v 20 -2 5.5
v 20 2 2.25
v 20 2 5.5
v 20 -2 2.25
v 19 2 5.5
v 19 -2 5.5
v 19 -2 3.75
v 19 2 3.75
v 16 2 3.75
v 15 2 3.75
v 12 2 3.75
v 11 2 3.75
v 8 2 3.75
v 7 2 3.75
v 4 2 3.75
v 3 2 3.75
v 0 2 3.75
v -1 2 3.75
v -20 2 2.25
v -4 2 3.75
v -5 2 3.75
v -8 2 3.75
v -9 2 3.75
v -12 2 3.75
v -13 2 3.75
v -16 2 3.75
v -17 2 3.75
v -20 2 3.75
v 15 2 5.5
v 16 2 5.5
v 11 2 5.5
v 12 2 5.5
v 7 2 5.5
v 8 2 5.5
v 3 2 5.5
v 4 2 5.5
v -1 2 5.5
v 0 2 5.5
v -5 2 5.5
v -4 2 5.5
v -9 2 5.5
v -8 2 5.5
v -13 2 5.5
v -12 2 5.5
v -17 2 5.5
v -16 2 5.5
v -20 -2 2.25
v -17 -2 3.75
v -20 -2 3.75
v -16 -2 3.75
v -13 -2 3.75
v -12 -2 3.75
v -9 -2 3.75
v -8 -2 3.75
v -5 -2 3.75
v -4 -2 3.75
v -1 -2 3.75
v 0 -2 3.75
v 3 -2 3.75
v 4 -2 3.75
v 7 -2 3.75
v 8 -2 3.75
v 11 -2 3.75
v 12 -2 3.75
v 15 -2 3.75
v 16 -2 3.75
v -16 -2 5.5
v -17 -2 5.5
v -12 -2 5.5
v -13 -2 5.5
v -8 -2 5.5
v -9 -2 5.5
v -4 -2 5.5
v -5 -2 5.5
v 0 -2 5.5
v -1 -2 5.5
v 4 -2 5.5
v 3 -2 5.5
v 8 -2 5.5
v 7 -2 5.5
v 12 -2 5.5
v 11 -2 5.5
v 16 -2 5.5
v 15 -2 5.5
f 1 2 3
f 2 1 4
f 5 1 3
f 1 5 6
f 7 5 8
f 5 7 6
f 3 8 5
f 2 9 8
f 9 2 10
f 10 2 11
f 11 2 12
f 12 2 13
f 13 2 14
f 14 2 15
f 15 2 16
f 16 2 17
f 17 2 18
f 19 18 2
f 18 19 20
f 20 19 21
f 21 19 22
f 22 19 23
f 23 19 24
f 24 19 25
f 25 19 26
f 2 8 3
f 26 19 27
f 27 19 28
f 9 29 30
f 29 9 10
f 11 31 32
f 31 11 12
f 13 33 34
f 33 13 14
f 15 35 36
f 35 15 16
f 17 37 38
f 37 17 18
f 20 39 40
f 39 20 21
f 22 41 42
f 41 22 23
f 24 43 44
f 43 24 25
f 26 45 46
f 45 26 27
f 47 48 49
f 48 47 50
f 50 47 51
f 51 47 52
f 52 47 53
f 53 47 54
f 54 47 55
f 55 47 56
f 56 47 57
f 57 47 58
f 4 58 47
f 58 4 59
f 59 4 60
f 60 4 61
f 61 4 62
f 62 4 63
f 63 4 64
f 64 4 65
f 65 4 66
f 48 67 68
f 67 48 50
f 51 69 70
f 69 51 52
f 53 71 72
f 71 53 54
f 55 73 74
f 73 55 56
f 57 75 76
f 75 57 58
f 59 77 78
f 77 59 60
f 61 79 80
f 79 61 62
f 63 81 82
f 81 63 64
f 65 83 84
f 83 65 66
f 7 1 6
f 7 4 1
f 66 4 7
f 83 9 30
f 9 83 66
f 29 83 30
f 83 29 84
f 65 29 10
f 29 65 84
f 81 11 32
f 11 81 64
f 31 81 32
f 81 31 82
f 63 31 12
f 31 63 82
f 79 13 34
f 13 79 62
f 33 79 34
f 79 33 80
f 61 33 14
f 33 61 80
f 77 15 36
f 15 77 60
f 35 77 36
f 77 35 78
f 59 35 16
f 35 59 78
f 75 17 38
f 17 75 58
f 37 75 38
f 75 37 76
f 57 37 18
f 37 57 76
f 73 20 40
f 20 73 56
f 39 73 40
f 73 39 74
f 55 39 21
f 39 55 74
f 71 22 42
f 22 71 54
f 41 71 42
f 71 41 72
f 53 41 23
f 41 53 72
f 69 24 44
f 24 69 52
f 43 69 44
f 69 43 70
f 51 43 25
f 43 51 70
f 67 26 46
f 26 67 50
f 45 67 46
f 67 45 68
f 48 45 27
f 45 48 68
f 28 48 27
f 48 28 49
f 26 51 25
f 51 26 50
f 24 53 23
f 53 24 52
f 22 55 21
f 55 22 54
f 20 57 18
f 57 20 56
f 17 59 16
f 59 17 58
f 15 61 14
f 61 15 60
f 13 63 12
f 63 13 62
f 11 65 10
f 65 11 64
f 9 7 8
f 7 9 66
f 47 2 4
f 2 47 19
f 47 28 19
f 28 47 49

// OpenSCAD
// file: thread.scad
module slice(t, width){
    rotate(90, [1, 0, 0])
    linear_extrude(height=0.01)
    polygon([
        [-t/2, -width/2],
        [-t/2, width/2],
        [t/2, width/2],
        [t/2, 0]
    ]);
    //cube([t, 0.01, width], center=true);
}

module thread(
    pitch = 3,
    width = 1,
    r = 3,
    t = 1,
    laps = 2,
    steps_per_lap = 20
){
    eps = 0.01;
    for (i = [0:steps_per_lap * laps - 1]){
        hull(){
            translate([0, 0, pitch * i/steps_per_lap])
            rotate(360 * i/steps_per_lap)
            translate([t/2 + r, 0, 0])
            slice(t, width);
                
            translate([0, 0, pitch * (i + 1)/steps_per_lap])
            rotate(360 * (i+1)/steps_per_lap)
            translate([t/2 + r, 0, 0])
            slice(t, width);
        }
    }
}

module inner_thread(
    pitch = 3,
    width = 1,
    r = 3,
    t = 1,
    laps = 2,
    steps_per_lap = 20
){
    eps = 0.01;
    for (i = [0:steps_per_lap * laps - 1]){
        hull(){
            translate([0, 0, pitch * i/steps_per_lap])
            rotate(360 * i/steps_per_lap)
            translate([t/2 + r, 0, 0])
            mirror([1, 0, 0]) slice(t, width);
                
            translate([0, 0, pitch * (i + 1)/steps_per_lap])
            rotate(360 * (i+1)/steps_per_lap)
            translate([t/2 + r, 0, 0])
            mirror([1, 0, 0]) slice(t, width);
        }
    }
}

laps = 6;
t=1;

inner_thread(
    pitch=2,
    width=1,
    r=3+0.3,
    t=t,
    laps=laps,
    steps_per_lap=20
);
difference(){
    translate([0, 0, -0.5]) cylinder(2*laps + 1, 5+0.3, 5+0.3, $fn=20);
    translate([0, 0, -0.5]) cylinder(2*laps + 1, 4+0.3, 4+0.3, $fn=20);
}


translate([12, 0, 0]){
    start = 10;
    translate([0, 0, -t/2]) cylinder(start, 3, 3, $fn=20);
    translate([0, 0, start]){
        thread(
            pitch=2,
            width=1,
            r=3,
            t=t,
            laps=laps,
            steps_per_lap=20
        );
        difference(){
            translate([0, 0, -0.5]) cylinder(2*laps + 1, 3, 3, $fn=20);
            translate([0, 0, -0.5]) cylinder(2*laps + 1, 2, 2, $fn=20);
        }
    }
}
// main file
use <thread.scad>

base_w = 10;
base_l = 20;
base_t = 2;

t = base_t;
r = 3;
pitch = 4;
width = 2;
base_gap = base_l - 2*base_t;
laps = (base_gap - width)/pitch;

start = 10;

if (false){
translate([-(base_l - 2*base_t)/2 + t*0.5, 0, r + 3 * t]){
    rotate(90, [0, 1, 0]){
        translate([0, 0, - start]) cylinder(start, 3, 3, $fn=20);
        translate([0, 0, -t/2 + laps*pitch]) cylinder(5, 3, 3, $fn=20);
        translate([0, 0, 0]){
            thread(
                pitch=pitch,
                width=width,
                r=r,
                t=t,
                laps=laps,
                steps_per_lap=20
            );
            difference(){
                translate([0, 0, -0.5]) cylinder(pitch*laps + width, 3, 3, $fn=20);
                translate([0, 0, -0.5]) cylinder(pitch*laps + width, 2, 2, $fn=20);
            }
        }
    }
}
}

module base(){
    translate([0, 0, base_t]) cube([base_l, base_w, base_t * 2], center=true);

    module gap(tol=0.2, res=20){
        difference(){
            h = 2*(r+t) + base_t + t;
            translate([0, 0, h/2 + base_t/2]) cube([base_t, base_w, h], center=true);
            translate([0, 0, h/2 + base_t]) rotate(90, [0, 1, 0]) cylinder(2*base_t, r + tol, r + tol, center=true, $fn=res);
        }
    }

    translate([base_l/2 - base_t/2, 0, 0]) gap();
    translate([- base_l/2 + base_t/2, 0, 0]) gap();
}

slot_w = base_w/2;

module real_base(){
    difference(){
        base();
        cutout = base_t*5 + 2* (r + tol);
        translate([0, 0, cutout/2 + base_t]) cube([base_l, slot_w, cutout], center=true);
    }
}

tol = 0.5;
module rod(){
    cube([base_l*2, slot_w - tol * 2, base_t - tol], center=true);
    for (i=[0:base_l * 2/pitch - 1]){
        translate([base_l - width/4 - i*pitch, 0, base_t - tol]) cube([width/2, slot_w - 2 * tol, base_t], center=true);
    }
}

//thread();
//real_base();
translate([0, 0, t*1.5]) rod();
